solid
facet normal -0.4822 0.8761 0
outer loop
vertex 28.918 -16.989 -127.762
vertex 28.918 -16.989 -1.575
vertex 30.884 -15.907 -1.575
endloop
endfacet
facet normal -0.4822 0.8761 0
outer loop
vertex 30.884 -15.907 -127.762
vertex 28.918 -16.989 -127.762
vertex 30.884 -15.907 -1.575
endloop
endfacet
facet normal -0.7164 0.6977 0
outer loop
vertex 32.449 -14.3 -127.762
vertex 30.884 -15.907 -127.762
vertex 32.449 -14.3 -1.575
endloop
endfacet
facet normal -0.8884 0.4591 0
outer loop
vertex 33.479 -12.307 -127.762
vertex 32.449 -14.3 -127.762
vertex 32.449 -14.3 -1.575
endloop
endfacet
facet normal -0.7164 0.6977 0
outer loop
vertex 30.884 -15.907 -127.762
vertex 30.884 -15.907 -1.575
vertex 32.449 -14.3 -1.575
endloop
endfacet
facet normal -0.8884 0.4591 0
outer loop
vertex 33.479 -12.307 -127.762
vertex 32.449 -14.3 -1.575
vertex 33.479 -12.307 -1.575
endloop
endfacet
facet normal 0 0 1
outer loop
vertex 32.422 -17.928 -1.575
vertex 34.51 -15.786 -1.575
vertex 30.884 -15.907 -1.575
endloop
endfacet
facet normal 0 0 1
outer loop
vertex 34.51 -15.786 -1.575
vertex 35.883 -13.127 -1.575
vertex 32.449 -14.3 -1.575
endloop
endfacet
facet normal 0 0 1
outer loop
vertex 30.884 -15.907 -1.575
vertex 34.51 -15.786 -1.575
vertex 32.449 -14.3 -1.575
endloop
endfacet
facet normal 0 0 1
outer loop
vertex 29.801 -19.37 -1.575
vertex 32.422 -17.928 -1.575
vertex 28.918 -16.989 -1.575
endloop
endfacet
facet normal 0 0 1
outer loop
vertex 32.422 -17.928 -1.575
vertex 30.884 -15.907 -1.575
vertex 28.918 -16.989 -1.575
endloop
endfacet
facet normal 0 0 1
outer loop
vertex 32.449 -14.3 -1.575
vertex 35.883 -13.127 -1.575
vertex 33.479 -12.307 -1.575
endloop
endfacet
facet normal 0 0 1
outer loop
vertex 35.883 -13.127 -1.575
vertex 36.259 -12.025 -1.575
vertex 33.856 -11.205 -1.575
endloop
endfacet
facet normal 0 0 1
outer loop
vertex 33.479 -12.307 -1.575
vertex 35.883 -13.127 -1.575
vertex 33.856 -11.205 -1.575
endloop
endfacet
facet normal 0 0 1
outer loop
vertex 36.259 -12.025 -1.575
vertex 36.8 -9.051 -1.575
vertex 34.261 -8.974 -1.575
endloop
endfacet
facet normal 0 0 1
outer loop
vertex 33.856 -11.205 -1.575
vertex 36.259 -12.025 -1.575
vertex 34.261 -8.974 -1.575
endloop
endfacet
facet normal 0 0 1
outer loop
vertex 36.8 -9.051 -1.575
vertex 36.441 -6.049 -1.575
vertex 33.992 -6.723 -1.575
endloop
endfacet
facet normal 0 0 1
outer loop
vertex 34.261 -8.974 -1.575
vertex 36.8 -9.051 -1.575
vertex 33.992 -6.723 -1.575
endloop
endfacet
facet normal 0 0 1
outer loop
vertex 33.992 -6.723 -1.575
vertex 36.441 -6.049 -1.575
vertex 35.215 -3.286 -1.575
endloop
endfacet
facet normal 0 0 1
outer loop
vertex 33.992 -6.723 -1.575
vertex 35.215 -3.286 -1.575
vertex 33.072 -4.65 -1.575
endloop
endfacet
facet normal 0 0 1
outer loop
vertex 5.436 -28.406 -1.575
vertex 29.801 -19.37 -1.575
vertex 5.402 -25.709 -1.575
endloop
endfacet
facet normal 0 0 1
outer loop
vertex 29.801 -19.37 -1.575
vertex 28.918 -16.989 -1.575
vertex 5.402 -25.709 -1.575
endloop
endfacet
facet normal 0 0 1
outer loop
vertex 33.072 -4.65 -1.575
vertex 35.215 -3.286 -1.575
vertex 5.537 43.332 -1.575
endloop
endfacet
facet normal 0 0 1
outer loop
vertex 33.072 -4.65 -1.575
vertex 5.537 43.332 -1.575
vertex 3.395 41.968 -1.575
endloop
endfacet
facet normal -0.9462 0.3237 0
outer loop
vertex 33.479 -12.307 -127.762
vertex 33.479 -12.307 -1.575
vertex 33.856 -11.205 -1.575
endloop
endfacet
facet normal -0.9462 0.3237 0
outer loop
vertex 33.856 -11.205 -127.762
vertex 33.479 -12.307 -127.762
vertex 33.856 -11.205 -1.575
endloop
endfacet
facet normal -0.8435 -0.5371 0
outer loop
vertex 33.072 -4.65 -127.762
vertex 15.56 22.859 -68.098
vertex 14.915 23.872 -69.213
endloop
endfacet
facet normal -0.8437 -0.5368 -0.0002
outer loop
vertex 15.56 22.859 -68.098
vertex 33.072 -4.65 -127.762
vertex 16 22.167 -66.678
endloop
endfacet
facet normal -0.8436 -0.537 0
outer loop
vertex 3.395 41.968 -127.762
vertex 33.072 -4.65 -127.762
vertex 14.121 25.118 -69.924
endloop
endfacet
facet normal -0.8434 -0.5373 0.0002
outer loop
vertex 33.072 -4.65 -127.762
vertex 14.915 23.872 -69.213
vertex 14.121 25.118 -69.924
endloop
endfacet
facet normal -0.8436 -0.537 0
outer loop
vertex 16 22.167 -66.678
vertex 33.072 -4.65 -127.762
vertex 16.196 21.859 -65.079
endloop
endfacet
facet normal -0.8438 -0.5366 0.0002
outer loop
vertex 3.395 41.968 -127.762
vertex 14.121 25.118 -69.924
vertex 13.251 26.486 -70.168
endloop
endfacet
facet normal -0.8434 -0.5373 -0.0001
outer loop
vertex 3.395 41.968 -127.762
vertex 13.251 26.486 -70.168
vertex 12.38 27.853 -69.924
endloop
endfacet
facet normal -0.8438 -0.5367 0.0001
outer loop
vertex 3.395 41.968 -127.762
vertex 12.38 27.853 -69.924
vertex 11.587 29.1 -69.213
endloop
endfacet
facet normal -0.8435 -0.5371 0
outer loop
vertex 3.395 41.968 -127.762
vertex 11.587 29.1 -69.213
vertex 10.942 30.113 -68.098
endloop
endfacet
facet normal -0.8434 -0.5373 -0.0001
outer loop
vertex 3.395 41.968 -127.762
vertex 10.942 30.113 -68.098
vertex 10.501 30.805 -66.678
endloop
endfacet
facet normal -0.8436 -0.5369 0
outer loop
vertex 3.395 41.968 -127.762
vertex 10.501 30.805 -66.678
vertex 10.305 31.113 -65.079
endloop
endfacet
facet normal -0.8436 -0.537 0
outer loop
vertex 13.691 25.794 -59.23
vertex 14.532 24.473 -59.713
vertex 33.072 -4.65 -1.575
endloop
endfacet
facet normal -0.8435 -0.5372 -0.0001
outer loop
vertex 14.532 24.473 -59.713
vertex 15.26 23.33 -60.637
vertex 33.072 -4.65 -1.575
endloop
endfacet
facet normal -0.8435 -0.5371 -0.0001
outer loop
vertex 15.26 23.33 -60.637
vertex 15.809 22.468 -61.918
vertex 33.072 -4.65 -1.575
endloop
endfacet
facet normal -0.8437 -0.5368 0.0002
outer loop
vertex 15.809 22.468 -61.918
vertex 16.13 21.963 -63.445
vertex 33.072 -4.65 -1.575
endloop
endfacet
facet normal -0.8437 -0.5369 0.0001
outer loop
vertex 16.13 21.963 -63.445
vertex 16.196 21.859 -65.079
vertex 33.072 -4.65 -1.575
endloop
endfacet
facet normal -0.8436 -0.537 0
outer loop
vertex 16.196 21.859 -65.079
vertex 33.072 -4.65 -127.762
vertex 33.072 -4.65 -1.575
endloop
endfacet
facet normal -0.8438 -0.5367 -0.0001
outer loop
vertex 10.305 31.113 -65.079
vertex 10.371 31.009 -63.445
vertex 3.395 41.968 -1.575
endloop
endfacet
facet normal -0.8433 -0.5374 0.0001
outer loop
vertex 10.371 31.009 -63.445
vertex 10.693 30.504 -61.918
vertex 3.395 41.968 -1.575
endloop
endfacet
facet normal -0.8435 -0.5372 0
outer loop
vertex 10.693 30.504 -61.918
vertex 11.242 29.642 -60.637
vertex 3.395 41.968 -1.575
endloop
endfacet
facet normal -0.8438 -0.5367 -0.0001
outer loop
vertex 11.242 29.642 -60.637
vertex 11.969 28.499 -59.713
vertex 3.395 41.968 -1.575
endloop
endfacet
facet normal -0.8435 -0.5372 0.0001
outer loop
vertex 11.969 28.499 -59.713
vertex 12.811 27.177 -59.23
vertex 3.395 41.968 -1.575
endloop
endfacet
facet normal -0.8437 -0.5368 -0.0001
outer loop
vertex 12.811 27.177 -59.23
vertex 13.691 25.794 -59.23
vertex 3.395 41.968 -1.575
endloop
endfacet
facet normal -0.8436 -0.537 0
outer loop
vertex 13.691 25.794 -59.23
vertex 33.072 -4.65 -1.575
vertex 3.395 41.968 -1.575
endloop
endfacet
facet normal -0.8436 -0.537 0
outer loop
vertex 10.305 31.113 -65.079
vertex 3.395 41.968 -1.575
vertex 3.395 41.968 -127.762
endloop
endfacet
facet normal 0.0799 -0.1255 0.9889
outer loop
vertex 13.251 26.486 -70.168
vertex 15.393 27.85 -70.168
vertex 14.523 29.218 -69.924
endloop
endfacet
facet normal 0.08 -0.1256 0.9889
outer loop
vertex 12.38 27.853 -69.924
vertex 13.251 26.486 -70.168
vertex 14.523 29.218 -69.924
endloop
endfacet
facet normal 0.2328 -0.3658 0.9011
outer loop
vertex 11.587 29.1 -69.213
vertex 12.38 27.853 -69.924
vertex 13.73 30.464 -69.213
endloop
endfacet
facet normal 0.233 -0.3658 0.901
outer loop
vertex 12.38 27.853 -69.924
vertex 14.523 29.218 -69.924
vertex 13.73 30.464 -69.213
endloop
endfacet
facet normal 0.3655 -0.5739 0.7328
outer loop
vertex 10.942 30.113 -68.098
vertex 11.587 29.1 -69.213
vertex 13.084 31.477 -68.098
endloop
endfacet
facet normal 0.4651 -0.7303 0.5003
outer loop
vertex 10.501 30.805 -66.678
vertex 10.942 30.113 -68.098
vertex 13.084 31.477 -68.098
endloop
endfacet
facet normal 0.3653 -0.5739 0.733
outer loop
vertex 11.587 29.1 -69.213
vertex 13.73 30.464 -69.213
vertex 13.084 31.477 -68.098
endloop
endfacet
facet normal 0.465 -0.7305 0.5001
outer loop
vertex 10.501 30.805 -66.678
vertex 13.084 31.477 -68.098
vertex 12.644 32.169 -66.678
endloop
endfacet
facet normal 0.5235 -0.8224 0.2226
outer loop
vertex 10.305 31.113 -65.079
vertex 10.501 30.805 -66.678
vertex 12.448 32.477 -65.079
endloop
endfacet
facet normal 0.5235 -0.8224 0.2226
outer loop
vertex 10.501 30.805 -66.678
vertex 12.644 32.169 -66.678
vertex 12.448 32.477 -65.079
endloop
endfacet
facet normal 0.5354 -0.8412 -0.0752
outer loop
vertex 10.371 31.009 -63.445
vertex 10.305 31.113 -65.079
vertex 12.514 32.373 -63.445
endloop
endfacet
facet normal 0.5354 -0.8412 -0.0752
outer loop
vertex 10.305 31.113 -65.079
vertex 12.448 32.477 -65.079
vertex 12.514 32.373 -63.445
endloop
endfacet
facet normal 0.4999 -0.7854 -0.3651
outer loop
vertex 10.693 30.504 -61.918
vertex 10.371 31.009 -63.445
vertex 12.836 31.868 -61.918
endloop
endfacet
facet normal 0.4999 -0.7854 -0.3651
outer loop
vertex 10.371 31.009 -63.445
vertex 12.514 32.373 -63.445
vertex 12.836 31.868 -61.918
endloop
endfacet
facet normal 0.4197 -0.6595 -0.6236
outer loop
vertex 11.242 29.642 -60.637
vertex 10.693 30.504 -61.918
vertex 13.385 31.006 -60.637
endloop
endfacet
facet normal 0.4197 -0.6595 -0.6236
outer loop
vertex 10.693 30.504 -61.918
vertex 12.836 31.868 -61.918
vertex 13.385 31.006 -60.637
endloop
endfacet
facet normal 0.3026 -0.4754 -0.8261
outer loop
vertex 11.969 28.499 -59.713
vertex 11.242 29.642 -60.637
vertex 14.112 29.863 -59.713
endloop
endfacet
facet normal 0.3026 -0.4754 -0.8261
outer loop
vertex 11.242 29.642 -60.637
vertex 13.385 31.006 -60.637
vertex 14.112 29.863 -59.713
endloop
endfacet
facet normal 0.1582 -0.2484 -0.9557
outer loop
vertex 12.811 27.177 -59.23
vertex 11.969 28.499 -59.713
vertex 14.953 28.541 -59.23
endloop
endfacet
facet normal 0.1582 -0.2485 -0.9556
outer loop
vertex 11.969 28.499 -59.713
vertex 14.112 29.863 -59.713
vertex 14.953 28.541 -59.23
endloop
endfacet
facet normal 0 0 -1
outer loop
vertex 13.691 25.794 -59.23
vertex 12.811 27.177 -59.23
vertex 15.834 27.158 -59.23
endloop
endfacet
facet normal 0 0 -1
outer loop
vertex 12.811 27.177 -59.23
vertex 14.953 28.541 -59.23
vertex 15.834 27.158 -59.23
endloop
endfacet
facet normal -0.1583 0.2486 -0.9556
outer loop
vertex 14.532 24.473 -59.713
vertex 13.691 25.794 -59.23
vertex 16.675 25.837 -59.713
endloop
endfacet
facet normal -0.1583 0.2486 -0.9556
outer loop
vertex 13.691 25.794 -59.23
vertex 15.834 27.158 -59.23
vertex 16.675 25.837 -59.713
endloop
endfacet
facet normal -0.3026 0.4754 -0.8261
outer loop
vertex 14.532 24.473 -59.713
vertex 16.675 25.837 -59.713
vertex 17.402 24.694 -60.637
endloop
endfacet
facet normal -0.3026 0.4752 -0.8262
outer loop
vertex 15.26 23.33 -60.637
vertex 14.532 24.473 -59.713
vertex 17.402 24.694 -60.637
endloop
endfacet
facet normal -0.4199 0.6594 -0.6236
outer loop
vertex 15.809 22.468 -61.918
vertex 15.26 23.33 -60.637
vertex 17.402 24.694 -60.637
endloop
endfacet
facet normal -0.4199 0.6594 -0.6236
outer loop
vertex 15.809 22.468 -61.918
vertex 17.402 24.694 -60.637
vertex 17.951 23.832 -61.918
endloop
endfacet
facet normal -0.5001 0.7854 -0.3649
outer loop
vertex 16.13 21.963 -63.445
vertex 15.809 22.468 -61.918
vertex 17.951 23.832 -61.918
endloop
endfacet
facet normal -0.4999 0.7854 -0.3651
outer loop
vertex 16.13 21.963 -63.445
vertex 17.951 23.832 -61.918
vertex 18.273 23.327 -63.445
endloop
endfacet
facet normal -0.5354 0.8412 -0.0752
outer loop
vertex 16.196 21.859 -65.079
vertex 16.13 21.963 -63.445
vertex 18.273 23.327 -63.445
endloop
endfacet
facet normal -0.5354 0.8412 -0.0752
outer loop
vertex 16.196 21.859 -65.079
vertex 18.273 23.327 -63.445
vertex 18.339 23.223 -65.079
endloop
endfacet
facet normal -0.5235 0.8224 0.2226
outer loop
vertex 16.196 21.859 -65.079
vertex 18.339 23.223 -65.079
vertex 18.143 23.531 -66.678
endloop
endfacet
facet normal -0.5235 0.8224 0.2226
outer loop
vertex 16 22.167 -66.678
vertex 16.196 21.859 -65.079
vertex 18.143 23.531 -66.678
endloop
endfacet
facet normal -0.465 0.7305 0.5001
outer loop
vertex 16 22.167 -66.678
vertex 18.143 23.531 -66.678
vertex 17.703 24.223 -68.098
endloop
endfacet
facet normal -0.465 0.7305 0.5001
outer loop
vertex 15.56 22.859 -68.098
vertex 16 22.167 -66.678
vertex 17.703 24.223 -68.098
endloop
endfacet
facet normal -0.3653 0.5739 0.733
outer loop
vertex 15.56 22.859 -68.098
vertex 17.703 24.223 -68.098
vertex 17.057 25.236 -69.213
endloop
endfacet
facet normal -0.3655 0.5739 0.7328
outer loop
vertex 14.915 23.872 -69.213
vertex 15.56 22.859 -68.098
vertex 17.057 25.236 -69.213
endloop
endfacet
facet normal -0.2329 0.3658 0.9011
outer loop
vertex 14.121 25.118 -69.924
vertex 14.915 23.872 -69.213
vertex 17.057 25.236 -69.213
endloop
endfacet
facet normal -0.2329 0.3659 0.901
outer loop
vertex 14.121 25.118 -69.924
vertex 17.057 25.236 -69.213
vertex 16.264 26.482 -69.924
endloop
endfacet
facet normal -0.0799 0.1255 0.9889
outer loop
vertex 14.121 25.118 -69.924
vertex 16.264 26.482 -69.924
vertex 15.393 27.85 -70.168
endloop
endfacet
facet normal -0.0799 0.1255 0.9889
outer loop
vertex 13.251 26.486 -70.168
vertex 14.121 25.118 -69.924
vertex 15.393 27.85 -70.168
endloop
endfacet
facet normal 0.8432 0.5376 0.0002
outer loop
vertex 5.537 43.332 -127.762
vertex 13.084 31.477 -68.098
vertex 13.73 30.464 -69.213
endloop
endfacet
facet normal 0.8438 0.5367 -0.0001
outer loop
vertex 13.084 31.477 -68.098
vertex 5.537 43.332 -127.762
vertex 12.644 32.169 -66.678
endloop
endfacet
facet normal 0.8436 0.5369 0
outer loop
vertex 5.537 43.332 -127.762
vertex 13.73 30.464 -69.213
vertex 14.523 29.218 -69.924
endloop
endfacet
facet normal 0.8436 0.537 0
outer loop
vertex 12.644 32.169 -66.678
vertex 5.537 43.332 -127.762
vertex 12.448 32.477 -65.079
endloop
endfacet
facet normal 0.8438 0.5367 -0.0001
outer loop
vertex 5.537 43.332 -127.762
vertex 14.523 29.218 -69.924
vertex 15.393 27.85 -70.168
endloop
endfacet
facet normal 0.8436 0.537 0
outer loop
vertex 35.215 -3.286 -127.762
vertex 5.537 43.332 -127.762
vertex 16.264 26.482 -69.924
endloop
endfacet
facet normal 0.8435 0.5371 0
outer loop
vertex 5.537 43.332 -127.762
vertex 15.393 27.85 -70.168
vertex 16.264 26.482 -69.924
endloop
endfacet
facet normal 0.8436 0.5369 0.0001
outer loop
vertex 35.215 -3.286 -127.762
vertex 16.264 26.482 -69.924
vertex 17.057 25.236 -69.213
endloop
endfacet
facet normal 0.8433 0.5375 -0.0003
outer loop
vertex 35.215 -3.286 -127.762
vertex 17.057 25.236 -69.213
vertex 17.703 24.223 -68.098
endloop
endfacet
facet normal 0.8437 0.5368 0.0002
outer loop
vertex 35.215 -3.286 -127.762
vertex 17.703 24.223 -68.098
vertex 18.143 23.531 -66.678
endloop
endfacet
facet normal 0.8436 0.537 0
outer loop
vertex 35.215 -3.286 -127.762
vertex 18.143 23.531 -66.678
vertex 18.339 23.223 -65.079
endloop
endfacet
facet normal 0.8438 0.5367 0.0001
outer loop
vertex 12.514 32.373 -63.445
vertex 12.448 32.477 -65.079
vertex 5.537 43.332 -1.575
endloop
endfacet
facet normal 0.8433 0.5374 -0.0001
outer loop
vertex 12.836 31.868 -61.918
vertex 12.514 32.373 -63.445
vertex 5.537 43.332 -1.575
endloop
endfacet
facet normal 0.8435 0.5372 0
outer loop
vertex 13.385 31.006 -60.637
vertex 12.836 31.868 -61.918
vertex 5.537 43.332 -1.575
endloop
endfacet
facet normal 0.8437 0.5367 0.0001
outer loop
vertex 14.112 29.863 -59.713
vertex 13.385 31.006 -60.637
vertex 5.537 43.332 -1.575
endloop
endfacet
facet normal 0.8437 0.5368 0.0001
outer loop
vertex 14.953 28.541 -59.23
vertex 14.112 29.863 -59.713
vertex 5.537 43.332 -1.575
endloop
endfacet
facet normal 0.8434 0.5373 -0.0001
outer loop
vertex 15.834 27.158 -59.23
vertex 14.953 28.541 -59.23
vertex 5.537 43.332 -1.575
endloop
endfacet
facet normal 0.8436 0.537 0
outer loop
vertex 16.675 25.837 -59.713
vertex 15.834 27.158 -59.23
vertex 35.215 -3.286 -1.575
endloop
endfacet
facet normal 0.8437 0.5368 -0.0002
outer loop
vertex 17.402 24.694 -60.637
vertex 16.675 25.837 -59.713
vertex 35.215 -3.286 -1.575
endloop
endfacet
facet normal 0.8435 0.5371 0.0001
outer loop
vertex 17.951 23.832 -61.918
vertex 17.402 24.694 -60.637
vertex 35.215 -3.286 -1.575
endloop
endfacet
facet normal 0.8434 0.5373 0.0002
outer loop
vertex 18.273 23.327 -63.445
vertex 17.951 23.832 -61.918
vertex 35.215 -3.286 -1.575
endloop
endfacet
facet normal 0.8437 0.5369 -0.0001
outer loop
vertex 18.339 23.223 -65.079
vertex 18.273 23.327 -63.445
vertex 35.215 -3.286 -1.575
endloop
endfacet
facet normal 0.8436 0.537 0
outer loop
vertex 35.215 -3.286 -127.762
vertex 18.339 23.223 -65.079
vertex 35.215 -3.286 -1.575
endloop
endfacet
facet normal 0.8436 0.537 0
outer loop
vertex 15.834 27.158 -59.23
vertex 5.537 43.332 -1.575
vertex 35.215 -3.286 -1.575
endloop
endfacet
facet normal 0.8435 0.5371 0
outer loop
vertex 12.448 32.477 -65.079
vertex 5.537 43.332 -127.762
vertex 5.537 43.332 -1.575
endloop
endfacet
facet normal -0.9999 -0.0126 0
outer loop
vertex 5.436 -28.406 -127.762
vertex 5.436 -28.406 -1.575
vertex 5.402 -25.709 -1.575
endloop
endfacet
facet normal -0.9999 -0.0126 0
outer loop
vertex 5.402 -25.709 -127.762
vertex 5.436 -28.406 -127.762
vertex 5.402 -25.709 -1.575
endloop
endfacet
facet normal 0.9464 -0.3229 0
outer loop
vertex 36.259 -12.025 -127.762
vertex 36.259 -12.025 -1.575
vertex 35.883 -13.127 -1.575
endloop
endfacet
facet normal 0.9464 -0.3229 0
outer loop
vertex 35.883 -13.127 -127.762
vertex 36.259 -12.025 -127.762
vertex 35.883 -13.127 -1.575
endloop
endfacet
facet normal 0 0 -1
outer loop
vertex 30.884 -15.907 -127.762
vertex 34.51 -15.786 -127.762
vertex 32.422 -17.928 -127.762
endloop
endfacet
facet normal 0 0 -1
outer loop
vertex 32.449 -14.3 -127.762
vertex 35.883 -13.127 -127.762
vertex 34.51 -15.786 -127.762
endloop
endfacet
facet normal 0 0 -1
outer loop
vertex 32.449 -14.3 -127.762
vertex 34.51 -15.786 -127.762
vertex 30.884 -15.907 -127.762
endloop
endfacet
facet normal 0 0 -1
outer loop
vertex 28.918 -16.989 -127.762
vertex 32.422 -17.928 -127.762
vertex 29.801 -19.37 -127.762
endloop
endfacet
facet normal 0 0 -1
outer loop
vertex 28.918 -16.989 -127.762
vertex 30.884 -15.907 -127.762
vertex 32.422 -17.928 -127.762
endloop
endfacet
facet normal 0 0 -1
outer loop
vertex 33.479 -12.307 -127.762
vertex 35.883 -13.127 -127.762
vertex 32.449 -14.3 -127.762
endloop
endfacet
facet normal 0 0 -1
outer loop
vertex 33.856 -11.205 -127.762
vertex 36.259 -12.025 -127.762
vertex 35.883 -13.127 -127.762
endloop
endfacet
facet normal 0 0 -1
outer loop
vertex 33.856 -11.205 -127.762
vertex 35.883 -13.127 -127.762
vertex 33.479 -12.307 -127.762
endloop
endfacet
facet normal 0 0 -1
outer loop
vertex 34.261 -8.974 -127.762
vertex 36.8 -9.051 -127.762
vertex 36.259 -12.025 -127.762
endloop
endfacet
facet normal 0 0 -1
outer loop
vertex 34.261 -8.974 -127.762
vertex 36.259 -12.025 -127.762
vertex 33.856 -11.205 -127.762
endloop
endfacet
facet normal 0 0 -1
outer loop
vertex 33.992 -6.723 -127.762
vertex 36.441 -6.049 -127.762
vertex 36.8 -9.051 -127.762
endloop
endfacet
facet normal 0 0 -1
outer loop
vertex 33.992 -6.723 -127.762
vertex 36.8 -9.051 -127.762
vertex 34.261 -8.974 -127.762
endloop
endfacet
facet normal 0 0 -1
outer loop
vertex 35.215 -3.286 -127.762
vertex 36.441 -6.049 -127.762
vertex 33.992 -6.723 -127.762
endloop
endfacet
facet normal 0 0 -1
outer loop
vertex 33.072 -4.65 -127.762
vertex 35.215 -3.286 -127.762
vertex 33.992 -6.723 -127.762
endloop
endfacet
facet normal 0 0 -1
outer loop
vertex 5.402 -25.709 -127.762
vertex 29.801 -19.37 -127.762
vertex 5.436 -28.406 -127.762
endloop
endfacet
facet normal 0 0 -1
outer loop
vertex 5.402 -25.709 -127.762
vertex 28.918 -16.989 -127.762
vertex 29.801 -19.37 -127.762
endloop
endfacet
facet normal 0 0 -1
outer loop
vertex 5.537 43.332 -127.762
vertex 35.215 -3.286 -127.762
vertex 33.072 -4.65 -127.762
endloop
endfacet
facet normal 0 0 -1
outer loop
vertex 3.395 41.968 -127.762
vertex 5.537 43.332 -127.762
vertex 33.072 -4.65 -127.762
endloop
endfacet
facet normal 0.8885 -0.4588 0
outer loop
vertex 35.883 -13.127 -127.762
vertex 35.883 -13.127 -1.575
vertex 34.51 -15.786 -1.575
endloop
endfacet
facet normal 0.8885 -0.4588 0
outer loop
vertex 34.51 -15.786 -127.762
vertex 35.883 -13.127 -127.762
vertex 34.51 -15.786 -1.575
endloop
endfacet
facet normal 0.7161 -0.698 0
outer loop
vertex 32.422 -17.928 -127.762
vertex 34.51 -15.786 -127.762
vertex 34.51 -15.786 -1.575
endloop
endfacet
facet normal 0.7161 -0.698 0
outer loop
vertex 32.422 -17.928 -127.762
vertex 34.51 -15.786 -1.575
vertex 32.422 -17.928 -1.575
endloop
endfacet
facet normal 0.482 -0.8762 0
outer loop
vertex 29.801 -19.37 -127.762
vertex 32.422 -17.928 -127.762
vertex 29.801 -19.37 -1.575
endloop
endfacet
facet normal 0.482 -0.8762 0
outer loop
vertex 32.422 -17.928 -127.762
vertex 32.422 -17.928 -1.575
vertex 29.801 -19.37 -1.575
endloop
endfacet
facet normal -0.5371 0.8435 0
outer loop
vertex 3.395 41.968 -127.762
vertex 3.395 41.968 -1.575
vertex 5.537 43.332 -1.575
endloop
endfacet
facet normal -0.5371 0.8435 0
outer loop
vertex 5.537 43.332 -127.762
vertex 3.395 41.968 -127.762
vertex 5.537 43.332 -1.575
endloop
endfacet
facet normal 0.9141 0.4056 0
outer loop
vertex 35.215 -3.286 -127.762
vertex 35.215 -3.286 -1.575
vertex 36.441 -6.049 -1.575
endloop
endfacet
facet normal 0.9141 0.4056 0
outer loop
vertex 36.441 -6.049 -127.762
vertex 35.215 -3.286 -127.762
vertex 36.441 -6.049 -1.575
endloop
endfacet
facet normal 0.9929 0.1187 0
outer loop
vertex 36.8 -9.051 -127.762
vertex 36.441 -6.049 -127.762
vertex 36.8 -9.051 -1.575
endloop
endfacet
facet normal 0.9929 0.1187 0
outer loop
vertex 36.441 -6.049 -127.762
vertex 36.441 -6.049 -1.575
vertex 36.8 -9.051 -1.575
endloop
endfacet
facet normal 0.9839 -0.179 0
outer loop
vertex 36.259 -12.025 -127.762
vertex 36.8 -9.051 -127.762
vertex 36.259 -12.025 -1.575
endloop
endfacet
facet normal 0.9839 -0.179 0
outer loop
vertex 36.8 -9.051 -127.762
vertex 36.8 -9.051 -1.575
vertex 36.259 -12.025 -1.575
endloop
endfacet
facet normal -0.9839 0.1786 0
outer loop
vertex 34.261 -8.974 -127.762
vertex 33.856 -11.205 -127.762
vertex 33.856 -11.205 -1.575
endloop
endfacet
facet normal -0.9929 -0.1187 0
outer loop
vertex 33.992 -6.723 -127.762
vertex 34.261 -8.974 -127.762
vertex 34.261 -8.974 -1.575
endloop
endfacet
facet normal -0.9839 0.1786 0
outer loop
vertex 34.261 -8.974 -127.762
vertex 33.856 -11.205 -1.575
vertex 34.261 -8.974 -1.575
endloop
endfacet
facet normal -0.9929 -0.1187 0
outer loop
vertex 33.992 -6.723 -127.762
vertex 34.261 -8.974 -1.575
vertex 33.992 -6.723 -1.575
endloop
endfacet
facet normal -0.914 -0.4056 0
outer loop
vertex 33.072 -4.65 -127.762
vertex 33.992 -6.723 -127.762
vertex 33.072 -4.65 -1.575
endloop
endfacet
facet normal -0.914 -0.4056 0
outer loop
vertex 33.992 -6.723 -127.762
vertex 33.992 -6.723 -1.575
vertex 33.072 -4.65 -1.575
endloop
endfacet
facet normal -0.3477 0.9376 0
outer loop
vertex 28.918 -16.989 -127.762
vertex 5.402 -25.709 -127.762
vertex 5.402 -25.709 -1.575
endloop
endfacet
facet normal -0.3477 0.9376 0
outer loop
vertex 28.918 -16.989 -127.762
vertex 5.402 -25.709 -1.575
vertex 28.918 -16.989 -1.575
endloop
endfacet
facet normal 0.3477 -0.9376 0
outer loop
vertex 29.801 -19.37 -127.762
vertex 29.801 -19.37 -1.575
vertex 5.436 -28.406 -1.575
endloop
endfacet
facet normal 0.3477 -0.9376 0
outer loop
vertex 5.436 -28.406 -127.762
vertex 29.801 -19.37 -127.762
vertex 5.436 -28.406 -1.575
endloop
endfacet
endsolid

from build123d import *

# Parameters (mm, degrees)
BOSS_EXTRUDE1_START = -1.5748
BOSS_EXTRUDE1_DEPTH = 126.1872
SKETCH2_R           = 5.499987026
CUT_EXTRUDE1_DEPTH  = 63.5


with BuildPart() as part:
    # Sketch1 → Boss-Extrude1 (new body)
    with BuildSketch(Plane.XY.offset(BOSS_EXTRUDE1_START)):
        with BuildLine():
            Line((5.5372, 43.3324), (35.215013396, -3.286034747))
            ThreePointArc((35.215013396, -3.286034747), (36.732607503, -7.536738968), (36.259288034, -12.025340858))
            Line((36.259288034, -12.025340858), (35.882961927, -13.127438743))
            ThreePointArc((35.882961927, -13.127438743), (33.545277751, -16.934256169), (29.80068515, -19.370370386))
            Line((29.80068515, -19.370370386), (5.435919899, -28.405771229))
            Line((5.435919899, -28.405771229), (5.401855854, -25.709375395))
            Line((5.401855854, -25.709375395), (28.91752571, -16.988852088))
            ThreePointArc((28.91752571, -16.988852088), (31.725970161, -15.161766425), (33.479233293, -12.306653356))
            Line((33.479233293, -12.306653356), (33.8555594, -11.204555471))
            ThreePointArc((33.8555594, -11.204555471), (34.210549002, -7.838104053), (33.072353421, -4.650075887))
            Line((33.072353421, -4.650075887), (3.394540025, 41.96835886))
            Line((3.394540025, 41.96835886), (5.5372, 43.3324))
        make_face()
    extrude(amount=-BOSS_EXTRUDE1_DEPTH)

    # Sketch2 → Cut-Extrude1 (cut)
    with BuildSketch(Plane(origin=(23.570559322, 15.005279885, 0), x_dir=(0, 0, -1), z_dir=(0.843566919, 0.537024071, 0))):
        with Locations((64.6684, 15.22665607)):
            Circle(SKETCH2_R)
    extrude(amount=-CUT_EXTRUDE1_DEPTH, mode=Mode.SUBTRACT)


solid = part.part
